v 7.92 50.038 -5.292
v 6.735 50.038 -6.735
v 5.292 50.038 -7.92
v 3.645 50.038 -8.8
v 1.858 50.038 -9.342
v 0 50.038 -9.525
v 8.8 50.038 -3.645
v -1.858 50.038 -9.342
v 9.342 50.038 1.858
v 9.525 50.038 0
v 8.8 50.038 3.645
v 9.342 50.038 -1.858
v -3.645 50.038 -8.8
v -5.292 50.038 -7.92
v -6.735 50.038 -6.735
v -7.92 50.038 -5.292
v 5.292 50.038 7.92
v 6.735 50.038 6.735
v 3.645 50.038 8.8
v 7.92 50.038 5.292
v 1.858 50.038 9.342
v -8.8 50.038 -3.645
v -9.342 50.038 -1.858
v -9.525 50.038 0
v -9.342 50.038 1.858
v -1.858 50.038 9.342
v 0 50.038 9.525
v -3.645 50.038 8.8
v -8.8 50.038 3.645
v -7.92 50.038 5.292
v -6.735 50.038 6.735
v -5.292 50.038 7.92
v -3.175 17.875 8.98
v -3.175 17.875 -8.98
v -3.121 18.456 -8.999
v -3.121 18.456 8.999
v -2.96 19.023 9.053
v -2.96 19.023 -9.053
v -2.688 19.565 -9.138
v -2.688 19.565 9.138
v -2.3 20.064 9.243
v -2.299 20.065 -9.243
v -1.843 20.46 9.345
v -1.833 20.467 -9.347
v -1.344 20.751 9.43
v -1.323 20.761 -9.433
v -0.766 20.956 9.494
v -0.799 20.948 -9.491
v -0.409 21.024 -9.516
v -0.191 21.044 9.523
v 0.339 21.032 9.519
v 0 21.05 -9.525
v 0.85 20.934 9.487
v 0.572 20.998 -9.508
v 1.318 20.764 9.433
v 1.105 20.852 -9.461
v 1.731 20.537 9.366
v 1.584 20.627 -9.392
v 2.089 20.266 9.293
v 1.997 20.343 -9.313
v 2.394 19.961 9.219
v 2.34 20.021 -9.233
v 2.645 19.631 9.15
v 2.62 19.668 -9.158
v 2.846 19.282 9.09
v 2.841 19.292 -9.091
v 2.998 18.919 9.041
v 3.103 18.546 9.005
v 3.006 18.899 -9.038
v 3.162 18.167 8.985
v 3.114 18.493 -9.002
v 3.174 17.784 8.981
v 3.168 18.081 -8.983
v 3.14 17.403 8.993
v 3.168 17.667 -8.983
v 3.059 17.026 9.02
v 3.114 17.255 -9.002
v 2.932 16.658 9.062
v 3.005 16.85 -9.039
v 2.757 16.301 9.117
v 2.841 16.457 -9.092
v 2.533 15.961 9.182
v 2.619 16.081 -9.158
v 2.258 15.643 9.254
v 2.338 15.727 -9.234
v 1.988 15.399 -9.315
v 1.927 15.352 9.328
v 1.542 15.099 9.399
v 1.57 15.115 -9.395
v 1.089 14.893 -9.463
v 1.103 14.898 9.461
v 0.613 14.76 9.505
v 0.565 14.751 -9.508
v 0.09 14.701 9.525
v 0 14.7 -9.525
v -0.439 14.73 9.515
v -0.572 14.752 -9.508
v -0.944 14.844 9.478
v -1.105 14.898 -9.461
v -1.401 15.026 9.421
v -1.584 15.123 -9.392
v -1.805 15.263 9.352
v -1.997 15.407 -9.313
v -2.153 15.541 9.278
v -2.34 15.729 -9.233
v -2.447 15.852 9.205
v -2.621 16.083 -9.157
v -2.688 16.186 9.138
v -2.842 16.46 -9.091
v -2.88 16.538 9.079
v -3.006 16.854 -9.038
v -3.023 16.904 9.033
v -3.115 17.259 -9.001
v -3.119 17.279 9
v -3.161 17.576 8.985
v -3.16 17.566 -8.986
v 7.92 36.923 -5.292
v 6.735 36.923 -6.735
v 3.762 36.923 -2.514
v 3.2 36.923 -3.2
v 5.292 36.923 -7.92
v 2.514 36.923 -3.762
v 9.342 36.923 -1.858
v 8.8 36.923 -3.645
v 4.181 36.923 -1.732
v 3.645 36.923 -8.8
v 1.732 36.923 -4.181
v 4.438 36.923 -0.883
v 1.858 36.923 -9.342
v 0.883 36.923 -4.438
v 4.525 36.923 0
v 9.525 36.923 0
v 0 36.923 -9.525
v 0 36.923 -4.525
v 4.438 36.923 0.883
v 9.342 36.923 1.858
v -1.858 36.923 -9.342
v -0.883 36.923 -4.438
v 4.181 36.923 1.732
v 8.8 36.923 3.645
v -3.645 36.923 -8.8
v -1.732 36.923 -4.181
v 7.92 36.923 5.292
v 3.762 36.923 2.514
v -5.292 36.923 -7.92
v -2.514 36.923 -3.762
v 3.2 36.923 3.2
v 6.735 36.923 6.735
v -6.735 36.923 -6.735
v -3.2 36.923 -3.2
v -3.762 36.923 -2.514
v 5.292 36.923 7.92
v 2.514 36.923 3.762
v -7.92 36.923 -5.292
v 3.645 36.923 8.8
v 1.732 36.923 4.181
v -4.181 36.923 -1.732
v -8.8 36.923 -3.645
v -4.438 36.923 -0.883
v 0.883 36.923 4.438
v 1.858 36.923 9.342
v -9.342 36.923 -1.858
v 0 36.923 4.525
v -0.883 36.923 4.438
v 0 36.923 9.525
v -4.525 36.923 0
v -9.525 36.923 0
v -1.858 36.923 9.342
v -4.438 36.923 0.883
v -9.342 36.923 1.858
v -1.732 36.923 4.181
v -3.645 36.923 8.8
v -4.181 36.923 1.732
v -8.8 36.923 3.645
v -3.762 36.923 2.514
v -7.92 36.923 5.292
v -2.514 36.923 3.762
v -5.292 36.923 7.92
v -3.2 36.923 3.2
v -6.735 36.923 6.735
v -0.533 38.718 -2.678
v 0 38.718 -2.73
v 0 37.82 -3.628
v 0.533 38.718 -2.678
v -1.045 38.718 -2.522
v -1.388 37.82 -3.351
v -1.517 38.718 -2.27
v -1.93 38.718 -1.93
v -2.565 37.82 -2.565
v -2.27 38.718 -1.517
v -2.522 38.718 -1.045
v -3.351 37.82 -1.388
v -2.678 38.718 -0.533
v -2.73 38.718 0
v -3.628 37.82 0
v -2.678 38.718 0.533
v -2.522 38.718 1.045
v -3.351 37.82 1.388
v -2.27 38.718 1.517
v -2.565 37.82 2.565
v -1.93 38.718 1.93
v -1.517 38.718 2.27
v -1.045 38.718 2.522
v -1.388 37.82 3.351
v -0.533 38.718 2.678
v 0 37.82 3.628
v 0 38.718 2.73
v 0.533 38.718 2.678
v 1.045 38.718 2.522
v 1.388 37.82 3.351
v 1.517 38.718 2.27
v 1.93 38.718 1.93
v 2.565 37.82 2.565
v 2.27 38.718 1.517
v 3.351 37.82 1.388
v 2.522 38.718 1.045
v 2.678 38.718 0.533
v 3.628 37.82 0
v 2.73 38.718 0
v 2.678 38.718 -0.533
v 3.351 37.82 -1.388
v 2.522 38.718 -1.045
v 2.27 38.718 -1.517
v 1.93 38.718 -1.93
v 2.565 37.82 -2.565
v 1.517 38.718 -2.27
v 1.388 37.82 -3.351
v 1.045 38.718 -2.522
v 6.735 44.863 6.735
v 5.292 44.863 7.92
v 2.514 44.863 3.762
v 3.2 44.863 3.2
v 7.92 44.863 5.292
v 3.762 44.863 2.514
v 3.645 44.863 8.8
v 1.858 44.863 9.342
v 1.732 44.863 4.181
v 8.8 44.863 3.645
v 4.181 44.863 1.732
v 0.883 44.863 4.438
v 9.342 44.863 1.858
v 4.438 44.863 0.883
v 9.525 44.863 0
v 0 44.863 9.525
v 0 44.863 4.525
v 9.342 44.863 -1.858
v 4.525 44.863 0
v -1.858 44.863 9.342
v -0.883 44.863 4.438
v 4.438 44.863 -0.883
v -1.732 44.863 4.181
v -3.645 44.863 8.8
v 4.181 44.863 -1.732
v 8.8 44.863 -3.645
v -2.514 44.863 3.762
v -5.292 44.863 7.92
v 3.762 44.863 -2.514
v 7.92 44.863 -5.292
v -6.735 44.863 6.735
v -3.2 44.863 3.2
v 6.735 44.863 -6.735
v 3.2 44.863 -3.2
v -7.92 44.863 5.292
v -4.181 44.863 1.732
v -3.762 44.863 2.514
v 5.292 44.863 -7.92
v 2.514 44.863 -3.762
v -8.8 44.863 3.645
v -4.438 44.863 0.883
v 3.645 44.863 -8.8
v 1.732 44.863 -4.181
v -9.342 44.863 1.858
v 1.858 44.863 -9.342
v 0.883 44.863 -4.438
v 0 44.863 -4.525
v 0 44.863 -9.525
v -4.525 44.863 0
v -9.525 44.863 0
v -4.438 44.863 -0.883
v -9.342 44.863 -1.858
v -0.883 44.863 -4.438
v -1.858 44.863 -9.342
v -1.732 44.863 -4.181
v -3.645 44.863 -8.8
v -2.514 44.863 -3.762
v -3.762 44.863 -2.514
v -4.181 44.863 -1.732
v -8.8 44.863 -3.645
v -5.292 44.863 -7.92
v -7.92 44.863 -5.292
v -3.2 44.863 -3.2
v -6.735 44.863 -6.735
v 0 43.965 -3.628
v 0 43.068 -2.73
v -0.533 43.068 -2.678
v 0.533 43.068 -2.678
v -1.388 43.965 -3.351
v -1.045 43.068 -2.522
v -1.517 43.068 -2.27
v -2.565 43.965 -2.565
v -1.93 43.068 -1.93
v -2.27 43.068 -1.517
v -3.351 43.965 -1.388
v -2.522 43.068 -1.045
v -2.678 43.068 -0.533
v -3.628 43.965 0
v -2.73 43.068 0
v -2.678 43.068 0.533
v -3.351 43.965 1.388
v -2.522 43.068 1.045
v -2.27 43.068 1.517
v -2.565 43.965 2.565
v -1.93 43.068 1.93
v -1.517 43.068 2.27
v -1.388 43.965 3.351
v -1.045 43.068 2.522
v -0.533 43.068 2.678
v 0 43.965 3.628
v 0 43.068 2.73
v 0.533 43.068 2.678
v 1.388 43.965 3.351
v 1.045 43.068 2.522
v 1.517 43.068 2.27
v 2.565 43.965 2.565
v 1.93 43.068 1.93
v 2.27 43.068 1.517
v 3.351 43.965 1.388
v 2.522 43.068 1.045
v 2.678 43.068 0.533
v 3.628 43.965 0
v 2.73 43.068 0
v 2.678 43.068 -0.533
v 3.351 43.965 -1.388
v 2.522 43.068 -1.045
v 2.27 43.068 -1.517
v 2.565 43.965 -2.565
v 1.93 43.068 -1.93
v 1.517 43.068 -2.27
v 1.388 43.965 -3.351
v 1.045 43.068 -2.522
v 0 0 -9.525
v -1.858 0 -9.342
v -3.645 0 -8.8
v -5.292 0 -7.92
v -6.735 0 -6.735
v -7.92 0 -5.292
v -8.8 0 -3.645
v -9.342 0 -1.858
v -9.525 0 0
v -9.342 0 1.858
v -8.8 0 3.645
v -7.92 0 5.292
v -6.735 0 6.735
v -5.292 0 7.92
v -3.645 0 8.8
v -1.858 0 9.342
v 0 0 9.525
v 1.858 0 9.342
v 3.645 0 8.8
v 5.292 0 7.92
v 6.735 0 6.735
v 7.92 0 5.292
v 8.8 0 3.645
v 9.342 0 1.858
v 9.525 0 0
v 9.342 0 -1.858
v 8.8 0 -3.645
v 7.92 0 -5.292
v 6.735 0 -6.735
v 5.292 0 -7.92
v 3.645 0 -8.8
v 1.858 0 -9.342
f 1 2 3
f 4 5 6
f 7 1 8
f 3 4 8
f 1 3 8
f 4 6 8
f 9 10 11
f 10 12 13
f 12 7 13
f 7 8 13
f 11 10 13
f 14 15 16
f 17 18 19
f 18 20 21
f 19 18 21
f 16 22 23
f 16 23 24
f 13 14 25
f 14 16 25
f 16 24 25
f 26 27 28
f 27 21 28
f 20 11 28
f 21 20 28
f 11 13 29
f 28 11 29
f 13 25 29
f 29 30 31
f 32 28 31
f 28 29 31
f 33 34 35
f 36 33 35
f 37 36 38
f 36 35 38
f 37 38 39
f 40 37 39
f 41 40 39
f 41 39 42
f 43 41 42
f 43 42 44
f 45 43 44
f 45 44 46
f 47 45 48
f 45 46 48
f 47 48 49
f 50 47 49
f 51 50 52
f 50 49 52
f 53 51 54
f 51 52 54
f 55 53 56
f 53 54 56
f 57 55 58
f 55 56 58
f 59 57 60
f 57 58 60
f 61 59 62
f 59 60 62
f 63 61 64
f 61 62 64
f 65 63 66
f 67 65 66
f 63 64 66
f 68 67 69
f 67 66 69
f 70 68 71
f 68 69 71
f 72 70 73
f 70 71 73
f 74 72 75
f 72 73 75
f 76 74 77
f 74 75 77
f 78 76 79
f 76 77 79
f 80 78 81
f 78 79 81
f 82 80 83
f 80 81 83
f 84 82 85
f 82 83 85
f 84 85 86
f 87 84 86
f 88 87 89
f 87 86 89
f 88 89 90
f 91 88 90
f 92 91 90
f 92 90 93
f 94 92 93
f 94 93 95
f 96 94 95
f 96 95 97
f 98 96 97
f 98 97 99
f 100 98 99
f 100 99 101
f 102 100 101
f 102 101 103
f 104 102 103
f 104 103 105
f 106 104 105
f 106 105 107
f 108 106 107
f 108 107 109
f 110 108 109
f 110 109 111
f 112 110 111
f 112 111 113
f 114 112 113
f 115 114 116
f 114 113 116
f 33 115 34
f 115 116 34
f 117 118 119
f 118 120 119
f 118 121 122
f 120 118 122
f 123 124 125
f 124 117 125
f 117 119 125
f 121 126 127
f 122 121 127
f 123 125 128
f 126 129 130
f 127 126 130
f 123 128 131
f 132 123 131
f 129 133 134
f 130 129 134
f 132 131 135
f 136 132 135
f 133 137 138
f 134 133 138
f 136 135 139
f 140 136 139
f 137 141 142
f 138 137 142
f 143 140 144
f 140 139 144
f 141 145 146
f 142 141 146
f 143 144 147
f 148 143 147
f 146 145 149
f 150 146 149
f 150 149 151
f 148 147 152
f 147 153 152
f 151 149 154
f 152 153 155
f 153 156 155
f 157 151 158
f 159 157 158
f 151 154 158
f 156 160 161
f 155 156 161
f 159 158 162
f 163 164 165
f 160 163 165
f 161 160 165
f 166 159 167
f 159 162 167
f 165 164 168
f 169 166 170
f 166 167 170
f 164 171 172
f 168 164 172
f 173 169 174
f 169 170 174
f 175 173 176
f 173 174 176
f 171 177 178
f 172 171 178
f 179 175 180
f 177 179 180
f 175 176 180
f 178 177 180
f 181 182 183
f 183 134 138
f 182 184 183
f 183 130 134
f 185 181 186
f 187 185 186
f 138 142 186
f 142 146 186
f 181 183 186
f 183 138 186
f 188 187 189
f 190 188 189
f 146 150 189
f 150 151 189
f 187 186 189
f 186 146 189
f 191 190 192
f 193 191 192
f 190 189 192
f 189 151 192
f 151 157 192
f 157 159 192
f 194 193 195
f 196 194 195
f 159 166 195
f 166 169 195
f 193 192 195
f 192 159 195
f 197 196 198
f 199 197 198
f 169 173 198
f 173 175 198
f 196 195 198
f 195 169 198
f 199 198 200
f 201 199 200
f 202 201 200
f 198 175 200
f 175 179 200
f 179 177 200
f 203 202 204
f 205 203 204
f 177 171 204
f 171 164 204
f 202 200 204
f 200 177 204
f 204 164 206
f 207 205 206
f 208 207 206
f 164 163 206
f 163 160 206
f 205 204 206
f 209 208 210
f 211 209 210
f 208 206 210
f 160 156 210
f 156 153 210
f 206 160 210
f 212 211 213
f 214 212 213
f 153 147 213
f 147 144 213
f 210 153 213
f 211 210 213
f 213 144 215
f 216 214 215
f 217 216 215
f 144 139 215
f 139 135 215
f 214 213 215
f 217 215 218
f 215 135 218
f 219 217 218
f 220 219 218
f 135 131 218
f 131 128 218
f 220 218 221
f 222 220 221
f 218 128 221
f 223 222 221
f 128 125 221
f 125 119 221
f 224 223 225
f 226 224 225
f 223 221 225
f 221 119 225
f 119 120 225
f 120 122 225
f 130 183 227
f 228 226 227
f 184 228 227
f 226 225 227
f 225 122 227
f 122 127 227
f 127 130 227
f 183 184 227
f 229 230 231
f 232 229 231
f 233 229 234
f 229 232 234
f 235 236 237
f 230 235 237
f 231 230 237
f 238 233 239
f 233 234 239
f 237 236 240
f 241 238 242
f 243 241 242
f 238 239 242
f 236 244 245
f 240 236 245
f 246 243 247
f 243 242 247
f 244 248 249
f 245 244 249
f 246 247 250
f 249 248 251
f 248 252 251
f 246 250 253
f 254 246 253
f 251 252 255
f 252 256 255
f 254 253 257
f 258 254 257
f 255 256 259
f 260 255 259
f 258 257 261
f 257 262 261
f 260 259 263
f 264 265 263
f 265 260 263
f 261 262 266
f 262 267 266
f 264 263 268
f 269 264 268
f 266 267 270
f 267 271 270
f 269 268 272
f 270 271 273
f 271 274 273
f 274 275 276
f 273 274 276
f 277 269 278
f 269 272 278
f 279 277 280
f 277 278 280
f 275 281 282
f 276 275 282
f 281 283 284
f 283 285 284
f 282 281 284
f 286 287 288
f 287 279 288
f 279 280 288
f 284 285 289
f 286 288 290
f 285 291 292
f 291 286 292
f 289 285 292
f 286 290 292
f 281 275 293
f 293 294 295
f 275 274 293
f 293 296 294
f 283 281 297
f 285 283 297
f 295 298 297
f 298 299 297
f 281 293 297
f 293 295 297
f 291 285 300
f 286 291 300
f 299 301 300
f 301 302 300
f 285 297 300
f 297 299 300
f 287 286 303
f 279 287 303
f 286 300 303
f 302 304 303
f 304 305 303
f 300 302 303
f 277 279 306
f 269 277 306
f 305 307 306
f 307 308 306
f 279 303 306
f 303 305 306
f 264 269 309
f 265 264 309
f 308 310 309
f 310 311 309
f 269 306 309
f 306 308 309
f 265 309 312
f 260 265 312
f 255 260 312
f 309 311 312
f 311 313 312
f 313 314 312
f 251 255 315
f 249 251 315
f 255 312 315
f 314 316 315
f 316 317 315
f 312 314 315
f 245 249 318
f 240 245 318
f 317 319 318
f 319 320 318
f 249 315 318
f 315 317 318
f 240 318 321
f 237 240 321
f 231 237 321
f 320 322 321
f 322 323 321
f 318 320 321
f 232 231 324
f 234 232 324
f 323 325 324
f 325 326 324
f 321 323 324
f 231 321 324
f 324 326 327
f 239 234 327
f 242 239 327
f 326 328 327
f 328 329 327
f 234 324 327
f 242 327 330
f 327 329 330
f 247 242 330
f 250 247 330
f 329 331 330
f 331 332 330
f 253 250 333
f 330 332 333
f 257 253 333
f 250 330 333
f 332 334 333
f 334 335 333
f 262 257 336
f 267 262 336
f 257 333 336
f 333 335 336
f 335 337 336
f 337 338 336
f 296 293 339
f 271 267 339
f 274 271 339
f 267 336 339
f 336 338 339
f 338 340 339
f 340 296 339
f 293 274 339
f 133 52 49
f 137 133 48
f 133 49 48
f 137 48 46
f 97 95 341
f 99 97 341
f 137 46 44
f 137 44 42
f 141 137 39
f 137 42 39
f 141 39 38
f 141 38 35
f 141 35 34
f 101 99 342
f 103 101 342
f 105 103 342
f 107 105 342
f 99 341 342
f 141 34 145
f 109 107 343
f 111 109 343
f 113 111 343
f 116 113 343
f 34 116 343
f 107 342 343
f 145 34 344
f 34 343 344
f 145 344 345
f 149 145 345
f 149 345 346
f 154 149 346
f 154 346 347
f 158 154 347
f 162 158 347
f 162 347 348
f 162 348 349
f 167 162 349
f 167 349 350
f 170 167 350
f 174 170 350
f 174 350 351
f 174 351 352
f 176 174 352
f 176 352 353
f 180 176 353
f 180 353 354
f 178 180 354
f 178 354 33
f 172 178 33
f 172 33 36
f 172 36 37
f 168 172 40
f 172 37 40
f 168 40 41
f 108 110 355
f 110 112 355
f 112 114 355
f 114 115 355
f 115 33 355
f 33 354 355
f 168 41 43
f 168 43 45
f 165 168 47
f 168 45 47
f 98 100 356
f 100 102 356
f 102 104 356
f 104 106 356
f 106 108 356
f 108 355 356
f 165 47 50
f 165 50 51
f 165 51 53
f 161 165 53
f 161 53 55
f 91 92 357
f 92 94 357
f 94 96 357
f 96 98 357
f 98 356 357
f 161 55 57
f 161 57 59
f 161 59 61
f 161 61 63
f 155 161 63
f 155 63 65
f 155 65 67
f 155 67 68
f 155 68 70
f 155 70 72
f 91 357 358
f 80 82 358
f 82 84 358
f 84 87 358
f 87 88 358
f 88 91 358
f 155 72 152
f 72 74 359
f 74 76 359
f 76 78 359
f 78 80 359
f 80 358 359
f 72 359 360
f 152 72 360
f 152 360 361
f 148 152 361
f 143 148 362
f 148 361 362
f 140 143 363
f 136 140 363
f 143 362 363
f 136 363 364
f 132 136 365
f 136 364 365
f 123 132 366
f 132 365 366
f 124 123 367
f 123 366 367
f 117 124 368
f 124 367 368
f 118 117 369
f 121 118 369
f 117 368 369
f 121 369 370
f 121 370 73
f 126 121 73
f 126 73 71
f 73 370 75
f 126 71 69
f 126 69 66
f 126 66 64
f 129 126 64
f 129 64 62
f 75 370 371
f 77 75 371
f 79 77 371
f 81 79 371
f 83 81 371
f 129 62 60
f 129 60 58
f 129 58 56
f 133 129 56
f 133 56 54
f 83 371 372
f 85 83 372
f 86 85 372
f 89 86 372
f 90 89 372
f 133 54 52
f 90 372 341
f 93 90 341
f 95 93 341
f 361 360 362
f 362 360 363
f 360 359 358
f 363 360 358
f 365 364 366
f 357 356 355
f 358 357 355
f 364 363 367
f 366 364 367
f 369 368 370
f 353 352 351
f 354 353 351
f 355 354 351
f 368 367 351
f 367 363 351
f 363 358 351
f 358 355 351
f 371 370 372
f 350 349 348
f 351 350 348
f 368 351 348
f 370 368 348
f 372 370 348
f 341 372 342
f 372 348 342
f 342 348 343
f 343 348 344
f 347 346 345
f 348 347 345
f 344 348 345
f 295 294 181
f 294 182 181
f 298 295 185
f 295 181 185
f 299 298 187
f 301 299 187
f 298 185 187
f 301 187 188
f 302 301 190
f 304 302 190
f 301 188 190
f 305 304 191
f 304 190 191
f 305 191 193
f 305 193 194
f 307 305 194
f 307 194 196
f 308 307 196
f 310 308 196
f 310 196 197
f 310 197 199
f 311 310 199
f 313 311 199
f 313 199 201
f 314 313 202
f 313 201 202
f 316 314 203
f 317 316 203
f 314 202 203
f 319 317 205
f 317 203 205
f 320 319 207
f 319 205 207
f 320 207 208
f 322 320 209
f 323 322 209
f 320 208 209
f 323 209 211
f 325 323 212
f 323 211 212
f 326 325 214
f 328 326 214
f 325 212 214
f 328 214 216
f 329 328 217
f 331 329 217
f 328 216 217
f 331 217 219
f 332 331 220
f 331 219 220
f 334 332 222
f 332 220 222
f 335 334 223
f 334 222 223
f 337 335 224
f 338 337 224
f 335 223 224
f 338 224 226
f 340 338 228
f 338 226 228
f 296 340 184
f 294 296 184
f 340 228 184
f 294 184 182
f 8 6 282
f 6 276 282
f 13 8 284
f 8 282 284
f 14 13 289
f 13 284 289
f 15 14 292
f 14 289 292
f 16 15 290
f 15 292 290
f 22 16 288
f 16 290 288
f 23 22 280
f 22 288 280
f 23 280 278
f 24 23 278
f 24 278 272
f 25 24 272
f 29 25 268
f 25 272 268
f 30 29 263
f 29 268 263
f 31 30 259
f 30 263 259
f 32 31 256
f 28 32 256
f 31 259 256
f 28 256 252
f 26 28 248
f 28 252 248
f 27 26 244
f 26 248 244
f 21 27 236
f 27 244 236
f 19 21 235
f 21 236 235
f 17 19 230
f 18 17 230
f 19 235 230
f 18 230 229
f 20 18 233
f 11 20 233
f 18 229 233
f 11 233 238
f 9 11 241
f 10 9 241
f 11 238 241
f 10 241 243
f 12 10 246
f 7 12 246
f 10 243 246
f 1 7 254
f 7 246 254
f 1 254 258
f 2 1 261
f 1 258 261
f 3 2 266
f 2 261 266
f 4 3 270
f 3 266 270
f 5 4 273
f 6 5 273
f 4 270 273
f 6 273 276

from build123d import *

# Parameters (mm, degrees)
DI_METRO_DE_TALADRO_1_4_0_25_1_D = 6.35


with BuildPart() as part:
    # Croquis1 → Revolución1 (revolve)
    with BuildSketch(Plane.XY, mode=Mode.PRIVATE) as revoluci_n1_sk:
        Polygon((-9.525, 0), (0, 0), (0, 50.038), (-9.525, 50.038), (-9.525, 44.86275), (-4.525, 44.86275), (-2.73, 43.06775), (-2.73, 38.71775), (-4.525, 36.92275), (-9.525, 36.92275), (-9.525, 22.63475), (-9.525, 2), align=None)
    revolve(revoluci_n1_sk.sketch.rotate(Axis((0, 0, 0), (0, 1, 0)), 270), axis=Axis((0, 0, 0), (0, 1, 0)))

    # Diámetro de taladro 1/4 (0.25)1 (through all)
    with Locations(Plane(origin=(0, 17.875, 9.525), x_dir=(1, 0, 0), z_dir=(0, 0, 1))):
        with Locations((0, 0)):
            Hole(DI_METRO_DE_TALADRO_1_4_0_25_1_D / 2)


solid = part.part
